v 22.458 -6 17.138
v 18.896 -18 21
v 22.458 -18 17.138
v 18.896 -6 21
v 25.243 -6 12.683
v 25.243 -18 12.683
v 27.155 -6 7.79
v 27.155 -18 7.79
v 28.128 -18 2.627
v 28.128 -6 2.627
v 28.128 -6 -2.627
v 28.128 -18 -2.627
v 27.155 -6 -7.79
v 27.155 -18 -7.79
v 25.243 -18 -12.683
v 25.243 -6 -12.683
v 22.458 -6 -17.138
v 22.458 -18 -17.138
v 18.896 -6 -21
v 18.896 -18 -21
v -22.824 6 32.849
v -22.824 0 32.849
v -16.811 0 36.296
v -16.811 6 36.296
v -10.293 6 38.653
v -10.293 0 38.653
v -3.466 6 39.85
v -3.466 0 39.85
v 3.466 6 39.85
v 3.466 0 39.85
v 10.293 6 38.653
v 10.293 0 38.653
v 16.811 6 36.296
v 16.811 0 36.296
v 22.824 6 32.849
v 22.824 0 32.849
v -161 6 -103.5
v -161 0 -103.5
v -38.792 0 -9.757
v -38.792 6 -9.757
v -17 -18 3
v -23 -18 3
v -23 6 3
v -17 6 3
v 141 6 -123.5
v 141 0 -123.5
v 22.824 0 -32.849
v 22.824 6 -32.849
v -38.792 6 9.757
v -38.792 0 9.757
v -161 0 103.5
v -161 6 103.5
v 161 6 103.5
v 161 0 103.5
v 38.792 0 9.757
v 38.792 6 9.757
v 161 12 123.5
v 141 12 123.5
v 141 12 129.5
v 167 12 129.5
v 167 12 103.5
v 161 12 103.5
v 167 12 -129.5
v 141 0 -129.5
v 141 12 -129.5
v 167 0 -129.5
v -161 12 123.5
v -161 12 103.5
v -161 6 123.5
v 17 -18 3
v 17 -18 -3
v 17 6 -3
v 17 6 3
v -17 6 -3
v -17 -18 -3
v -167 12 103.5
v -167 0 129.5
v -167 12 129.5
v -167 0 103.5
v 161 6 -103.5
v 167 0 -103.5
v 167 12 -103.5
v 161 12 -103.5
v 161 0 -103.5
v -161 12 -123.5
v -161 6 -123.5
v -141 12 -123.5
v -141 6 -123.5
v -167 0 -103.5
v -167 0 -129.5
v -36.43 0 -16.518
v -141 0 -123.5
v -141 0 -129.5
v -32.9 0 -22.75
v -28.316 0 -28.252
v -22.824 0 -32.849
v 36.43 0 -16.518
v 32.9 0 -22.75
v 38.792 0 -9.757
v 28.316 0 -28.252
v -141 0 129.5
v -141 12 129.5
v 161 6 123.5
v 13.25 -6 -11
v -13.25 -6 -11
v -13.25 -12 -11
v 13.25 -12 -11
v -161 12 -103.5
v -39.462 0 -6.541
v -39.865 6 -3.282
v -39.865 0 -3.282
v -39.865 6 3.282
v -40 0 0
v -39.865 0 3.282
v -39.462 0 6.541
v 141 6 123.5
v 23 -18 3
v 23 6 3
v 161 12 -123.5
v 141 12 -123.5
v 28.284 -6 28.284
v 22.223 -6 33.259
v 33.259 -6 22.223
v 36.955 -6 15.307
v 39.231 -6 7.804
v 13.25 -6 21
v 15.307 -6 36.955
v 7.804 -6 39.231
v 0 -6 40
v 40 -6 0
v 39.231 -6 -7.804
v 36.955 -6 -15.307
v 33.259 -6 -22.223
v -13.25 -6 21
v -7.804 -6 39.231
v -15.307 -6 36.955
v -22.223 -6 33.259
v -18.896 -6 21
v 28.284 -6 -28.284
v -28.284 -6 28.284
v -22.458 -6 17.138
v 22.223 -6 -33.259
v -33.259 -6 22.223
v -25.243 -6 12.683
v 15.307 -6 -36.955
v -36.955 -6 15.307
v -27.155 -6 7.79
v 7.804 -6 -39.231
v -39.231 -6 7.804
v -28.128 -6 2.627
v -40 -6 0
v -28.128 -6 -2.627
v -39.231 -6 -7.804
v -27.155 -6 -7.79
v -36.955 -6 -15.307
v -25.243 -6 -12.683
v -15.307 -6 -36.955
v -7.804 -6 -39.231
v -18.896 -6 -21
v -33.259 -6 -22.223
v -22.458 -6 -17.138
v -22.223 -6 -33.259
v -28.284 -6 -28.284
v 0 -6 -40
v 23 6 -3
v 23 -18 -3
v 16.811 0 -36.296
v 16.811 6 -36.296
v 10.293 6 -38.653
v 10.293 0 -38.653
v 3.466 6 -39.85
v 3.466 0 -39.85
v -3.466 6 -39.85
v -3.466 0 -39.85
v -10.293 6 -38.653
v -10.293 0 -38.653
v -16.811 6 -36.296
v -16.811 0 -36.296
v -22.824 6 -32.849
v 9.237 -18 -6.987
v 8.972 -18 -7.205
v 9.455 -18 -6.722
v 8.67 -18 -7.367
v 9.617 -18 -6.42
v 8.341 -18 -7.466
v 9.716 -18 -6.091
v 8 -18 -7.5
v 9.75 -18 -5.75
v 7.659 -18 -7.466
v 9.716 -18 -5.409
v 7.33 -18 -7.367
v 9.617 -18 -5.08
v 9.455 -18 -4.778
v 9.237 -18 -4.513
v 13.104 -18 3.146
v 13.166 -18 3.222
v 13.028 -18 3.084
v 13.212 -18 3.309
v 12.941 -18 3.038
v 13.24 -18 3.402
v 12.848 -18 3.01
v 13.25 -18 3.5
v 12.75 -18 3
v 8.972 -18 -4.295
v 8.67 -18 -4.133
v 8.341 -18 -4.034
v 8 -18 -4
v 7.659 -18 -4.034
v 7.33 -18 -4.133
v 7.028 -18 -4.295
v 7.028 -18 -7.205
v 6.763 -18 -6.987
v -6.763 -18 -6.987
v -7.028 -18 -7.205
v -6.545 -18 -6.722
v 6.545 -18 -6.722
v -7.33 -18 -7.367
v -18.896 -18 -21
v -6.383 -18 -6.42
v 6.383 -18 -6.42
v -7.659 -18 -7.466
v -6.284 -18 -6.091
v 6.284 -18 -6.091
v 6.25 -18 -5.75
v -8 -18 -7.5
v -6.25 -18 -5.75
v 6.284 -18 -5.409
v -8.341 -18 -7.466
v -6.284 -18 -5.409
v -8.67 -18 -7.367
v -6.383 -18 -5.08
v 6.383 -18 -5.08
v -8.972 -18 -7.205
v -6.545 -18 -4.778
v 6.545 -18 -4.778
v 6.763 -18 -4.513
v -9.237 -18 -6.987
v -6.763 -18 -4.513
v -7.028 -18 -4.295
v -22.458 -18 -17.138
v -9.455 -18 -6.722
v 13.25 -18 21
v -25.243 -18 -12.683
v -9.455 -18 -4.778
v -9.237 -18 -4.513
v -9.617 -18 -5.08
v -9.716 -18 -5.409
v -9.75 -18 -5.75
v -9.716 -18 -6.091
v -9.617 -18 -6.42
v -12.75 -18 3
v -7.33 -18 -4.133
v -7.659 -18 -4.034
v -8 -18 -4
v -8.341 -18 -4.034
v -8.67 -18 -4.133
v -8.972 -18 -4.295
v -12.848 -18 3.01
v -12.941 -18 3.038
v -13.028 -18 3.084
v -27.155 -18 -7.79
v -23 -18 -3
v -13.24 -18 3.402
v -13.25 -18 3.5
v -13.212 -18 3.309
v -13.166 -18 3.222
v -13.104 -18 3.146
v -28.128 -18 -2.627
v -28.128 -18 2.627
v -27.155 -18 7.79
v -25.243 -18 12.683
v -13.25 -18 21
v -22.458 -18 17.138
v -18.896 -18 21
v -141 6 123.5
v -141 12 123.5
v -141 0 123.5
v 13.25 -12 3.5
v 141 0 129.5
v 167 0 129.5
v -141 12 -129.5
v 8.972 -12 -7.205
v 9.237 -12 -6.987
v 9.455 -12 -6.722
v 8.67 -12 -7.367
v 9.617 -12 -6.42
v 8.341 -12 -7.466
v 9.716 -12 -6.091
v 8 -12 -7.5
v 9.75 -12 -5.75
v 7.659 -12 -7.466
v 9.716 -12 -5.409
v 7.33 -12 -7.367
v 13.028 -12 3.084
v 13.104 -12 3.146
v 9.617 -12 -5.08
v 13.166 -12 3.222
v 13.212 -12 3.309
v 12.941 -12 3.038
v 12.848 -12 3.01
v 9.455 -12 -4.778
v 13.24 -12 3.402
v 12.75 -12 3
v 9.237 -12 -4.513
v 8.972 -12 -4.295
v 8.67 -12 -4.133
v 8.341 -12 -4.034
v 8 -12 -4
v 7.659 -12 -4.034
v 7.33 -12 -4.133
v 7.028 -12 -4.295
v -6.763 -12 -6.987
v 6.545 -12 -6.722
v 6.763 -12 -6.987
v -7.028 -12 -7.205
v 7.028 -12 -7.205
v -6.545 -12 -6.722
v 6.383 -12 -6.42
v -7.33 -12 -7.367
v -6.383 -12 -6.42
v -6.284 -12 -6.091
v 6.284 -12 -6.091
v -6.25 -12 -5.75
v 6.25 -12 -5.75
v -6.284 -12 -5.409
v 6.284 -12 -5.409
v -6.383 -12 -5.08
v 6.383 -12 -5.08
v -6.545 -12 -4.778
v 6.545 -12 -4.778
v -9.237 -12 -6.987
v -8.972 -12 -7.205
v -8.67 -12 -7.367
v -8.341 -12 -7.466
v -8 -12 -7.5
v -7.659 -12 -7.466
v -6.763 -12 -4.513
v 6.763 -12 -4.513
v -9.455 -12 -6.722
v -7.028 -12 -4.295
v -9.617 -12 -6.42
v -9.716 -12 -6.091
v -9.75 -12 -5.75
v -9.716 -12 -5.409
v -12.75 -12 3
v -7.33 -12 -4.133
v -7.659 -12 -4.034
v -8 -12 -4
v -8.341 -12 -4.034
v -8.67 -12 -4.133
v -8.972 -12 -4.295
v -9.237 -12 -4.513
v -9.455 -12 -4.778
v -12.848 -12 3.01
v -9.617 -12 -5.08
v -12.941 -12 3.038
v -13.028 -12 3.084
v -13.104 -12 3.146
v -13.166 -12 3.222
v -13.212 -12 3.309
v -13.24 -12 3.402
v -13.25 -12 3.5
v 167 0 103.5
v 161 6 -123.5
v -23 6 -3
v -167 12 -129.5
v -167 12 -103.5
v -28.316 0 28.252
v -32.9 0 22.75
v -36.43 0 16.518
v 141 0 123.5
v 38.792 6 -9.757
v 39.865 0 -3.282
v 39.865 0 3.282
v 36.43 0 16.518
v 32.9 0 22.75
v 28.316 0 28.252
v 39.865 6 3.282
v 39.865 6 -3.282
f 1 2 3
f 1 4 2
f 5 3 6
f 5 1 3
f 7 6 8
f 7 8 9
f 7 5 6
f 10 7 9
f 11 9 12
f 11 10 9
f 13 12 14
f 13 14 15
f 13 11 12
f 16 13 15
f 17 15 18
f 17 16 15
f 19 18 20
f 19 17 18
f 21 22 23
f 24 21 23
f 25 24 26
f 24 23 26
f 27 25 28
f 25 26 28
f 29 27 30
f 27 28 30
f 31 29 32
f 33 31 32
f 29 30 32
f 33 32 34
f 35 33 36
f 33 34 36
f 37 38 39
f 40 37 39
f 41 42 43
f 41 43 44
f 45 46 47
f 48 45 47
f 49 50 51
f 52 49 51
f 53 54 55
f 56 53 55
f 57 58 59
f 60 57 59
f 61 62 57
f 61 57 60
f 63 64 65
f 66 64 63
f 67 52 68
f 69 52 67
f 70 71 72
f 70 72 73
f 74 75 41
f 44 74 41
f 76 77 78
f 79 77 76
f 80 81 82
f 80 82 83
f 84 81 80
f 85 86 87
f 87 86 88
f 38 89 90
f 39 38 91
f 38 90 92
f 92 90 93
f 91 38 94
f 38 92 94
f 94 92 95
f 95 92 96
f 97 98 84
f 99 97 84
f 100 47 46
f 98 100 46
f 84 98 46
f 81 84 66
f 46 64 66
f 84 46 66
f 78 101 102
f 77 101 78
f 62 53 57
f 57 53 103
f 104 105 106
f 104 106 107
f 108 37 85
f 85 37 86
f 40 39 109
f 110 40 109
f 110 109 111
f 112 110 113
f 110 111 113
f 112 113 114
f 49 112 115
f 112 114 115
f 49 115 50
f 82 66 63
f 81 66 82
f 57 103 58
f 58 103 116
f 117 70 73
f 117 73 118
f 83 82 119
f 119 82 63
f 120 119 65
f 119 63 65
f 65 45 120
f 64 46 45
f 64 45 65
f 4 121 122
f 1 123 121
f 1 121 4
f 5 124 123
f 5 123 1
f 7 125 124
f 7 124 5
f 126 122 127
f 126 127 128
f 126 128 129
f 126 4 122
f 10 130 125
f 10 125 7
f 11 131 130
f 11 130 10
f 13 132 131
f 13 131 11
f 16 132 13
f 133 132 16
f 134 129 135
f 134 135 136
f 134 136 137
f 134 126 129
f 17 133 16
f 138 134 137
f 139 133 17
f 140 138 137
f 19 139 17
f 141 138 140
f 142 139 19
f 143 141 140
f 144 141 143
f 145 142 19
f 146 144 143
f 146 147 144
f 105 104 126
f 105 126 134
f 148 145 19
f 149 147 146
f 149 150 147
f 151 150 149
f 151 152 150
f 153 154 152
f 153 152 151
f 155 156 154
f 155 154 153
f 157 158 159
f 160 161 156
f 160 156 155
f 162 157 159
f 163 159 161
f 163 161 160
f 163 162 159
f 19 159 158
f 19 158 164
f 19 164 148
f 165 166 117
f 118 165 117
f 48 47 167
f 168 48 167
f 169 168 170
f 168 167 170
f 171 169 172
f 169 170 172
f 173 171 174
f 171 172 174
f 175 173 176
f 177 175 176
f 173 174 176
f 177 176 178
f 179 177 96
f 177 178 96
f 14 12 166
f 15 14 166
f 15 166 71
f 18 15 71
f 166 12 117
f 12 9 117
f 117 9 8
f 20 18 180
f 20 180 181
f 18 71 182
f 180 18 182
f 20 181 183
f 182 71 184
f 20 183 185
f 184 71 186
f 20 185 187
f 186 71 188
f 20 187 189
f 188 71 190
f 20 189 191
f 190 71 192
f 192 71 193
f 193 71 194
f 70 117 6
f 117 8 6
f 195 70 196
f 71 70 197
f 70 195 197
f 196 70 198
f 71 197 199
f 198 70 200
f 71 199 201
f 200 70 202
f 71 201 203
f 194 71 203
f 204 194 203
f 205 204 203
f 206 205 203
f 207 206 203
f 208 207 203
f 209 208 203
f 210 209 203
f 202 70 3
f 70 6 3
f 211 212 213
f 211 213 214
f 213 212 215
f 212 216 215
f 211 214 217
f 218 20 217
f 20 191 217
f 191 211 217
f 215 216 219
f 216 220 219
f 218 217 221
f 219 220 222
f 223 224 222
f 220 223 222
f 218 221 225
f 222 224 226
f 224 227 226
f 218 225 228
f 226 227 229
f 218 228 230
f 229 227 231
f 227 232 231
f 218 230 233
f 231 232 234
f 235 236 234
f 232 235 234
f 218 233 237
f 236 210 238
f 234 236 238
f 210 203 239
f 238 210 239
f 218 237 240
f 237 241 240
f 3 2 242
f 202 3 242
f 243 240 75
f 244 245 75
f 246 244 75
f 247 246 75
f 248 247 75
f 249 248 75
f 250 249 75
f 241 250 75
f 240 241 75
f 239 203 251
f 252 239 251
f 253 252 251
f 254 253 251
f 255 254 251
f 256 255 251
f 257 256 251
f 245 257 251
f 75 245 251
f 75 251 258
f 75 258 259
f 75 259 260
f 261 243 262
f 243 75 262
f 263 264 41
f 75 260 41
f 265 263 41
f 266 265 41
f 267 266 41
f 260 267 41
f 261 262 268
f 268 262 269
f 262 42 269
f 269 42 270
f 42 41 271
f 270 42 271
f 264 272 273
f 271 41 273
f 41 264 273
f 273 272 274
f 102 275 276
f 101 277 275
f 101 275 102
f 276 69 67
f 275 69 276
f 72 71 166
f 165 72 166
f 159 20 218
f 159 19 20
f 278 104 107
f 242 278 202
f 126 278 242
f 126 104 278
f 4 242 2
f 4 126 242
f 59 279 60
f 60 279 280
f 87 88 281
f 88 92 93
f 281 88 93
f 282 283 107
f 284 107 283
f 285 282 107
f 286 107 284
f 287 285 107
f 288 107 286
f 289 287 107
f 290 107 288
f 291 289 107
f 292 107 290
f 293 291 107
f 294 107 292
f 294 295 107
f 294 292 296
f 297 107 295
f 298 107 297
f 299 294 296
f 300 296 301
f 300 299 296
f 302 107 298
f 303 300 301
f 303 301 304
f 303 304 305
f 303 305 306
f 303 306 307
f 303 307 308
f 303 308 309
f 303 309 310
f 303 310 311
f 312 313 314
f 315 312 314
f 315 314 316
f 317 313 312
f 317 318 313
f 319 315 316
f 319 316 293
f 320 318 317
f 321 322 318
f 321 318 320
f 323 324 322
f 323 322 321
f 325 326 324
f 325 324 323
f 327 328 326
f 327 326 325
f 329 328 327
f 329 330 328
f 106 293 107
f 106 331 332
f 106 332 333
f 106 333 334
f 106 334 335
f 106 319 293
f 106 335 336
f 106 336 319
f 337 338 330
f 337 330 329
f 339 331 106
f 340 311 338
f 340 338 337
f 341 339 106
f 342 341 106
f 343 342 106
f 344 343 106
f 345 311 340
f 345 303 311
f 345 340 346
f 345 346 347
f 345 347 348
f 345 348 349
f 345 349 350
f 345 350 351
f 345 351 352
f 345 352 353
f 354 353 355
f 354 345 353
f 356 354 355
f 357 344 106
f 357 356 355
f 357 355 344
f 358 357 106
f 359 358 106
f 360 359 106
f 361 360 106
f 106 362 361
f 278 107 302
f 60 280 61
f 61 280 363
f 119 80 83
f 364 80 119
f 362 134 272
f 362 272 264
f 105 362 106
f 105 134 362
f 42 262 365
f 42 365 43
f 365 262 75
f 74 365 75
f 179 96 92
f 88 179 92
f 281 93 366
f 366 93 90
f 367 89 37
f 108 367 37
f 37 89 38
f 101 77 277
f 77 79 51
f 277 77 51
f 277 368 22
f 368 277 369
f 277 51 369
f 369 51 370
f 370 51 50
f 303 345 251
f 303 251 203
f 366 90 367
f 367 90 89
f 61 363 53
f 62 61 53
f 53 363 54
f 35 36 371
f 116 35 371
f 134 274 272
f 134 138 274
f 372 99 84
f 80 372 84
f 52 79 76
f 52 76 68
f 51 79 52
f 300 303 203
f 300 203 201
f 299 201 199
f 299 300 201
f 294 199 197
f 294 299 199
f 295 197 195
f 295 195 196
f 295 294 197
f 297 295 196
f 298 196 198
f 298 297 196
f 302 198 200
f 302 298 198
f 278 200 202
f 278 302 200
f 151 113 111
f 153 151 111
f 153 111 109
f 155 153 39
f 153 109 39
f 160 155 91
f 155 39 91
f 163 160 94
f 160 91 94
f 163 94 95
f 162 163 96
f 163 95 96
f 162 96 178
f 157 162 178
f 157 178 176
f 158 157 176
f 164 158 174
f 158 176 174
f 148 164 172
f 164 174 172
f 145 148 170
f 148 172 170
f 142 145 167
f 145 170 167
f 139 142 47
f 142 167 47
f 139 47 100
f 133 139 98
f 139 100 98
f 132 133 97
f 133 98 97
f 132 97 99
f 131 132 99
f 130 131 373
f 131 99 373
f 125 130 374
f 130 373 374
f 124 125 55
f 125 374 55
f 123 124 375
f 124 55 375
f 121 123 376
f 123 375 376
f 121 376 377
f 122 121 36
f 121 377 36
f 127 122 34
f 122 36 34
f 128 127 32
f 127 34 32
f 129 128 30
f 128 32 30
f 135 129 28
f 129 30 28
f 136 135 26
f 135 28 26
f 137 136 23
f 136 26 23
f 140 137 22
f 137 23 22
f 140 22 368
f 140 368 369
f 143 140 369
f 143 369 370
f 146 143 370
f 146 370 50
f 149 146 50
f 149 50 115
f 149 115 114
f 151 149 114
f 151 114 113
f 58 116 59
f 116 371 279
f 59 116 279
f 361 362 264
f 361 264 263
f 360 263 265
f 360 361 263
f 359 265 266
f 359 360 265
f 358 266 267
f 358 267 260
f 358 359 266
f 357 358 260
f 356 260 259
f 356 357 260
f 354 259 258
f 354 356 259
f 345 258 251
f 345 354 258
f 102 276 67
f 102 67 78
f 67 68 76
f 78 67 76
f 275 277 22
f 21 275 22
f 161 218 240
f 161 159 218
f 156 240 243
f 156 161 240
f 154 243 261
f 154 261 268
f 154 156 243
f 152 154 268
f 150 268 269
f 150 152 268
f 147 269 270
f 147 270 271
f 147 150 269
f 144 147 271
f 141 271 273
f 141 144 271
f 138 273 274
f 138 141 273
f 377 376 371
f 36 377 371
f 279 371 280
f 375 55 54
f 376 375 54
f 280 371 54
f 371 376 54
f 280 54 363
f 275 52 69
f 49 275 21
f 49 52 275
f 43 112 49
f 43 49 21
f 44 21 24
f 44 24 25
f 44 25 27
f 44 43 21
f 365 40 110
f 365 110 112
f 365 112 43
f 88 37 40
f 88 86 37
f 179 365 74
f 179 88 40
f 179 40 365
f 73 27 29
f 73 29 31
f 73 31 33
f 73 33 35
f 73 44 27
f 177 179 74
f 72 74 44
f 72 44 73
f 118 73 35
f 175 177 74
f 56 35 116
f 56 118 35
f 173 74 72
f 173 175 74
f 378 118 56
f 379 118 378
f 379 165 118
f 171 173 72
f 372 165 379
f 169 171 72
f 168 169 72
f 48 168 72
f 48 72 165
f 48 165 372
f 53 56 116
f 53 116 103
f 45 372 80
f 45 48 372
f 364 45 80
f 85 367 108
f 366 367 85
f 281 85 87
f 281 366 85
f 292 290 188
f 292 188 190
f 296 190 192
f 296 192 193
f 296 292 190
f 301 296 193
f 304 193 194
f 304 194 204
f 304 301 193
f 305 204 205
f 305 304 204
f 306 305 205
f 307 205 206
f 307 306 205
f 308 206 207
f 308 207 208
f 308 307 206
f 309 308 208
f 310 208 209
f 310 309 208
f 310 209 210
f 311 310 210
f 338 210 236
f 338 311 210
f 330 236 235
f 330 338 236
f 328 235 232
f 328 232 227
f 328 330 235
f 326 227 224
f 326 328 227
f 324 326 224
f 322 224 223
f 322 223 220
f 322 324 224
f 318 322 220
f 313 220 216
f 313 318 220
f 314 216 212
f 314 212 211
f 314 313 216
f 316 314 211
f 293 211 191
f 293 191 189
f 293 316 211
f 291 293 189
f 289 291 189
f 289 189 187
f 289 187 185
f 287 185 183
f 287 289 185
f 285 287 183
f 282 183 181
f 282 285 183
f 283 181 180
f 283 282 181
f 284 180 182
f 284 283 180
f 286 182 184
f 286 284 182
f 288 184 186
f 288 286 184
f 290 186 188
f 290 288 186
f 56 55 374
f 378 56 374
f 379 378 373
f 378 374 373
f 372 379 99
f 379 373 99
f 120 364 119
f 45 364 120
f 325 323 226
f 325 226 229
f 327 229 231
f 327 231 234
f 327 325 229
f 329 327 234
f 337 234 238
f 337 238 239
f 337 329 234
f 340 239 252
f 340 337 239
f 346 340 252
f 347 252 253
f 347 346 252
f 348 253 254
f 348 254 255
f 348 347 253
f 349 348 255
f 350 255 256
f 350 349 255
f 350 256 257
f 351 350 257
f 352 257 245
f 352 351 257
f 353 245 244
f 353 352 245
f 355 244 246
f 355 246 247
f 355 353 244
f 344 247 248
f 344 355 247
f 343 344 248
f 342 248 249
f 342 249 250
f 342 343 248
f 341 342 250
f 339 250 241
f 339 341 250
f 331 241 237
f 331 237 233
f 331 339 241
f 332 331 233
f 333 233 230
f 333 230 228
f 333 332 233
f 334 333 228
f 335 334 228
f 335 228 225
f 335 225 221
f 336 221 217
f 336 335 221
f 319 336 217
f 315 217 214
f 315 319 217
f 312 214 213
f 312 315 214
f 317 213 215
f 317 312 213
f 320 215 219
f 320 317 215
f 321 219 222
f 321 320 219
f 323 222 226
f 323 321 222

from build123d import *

# Parameters (mm, degrees)
SALIENTE_EXTRUIR1_DEPTH = 6
SALIENTE_EXTRUIR2_DEPTH = 12
CROQUIS7_R              = 40
SALIENTE_EXTRUIR5_DEPTH = 6
SALIENTE_EXTRUIR3_DEPTH = 6
CROQUIS6_R              = 1.75
SALIENTE_EXTRUIR4_DEPTH = 6
CROQUIS8_W              = 6
CROQUIS8_H              = 6
CORTAR_EXTRUIR1_DEPTH   = 31


with BuildPart() as part:
    # Croquis1 → Saliente-Extruir1 (new body)
    with BuildSketch(Plane(origin=(0, 0, 0), x_dir=(1, 0, 0), z_dir=(0, 1, 0))):
        with BuildLine():
            Line((-161, 103.5), (-38.791887254, 9.756509788))
            ThreePointArc((-38.791887254, 9.756509788), (-40, 0), (-38.791887254, -9.756509788))
            Line((-38.791887254, -9.756509788), (-161, -103.5))
            Line((-161, -103.5), (-161, -123.5))
            Line((-161, -123.5), (-141, -123.5))
            Line((-141, -123.5), (-22.823766962, -32.84928708))
            ThreePointArc((-22.823766962, -32.84928708), (0, -40), (22.823766962, -32.84928708))
            Line((22.823766962, -32.84928708), (141, -123.5))
            Line((141, -123.5), (161, -123.5))
            Line((161, -123.5), (161, -103.5))
            Line((161, -103.5), (38.791887254, -9.756509788))
            ThreePointArc((38.791887254, -9.756509788), (40, 0), (38.791887254, 9.756509788))
            Line((38.791887254, 9.756509788), (161, 103.5))
            Line((161, 103.5), (161, 123.5))
            Line((161, 123.5), (141, 123.5))
            Line((141, 123.5), (22.823766962, 32.84928708))
            ThreePointArc((22.823766962, 32.84928708), (0, 40), (-22.823766962, 32.84928708))
            Line((-22.823766962, 32.84928708), (-141, 123.5))
            Line((-141, 123.5), (-161, 123.5))
            Line((-161, 123.5), (-161, 103.5))
        make_face()
    extrude(amount=SALIENTE_EXTRUIR1_DEPTH)

    # Croquis4 → Saliente-Extruir2 (add)
    with BuildSketch(Plane(origin=(0, 0, 0), x_dir=(1, 0, 0), z_dir=(0, 1, 0))):
        Polygon((-161, 103.5), (-161, 123.5), (-141, 123.5), (-141, 129.5), (-167, 129.5), (-167, 103.5), align=None)
        Polygon((-161, -103.5), (-161, -123.5), (-141, -123.5), (-141, -129.5), (-167, -129.5), (-167, -103.5), align=None)
        Polygon((167, -103.5), (161, -103.5), (161, -123.5), (141, -123.5), (141, -129.5), (167, -129.5), align=None)
        Polygon((167, 103.5), (161, 103.5), (161, 123.5), (141, 123.5), (141, 129.5), (167, 129.5), align=None)
    extrude(amount=SALIENTE_EXTRUIR2_DEPTH)

    # Croquis7 → Saliente-Extruir5 (add)
    with BuildSketch(Plane(origin=(0, 0, 0), x_dir=(-1, 0, 0), z_dir=(0, -1, 0))):
        Circle(CROQUIS7_R)
    extrude(amount=SALIENTE_EXTRUIR5_DEPTH)

    # Croquis5 → Saliente-Extruir3 (add)
    with BuildSketch(Plane.XZ.offset(6)):
        with BuildLine():
            Line((18.896097481, -21), (-18.896097481, -21))
            ThreePointArc((-18.896097481, -21), (-28.25, 0), (-18.896097481, 21))
            Line((-18.896097481, 21), (-13.25, 21))
            Line((-13.25, 21), (-13.25, -11))
            Line((-13.25, -11), (13.25, -11))
            Line((13.25, -11), (13.25, 21))
            Line((13.25, 21), (18.896097481, 21))
            ThreePointArc((18.896097481, 21), (28.25, 0), (18.896097481, -21))
        make_face()
    extrude(amount=SALIENTE_EXTRUIR3_DEPTH)

    # Croquis6 → Saliente-Extruir4 (add)
    with BuildSketch(Plane.XZ.offset(12)):
        with BuildLine():
            Line((-18.896097481, 21), (-13.25, 21))
            Line((-13.25, 21), (-13.25, 3.5))
            ThreePointArc((-13.25, 3.5), (-13.103553391, 3.146446609), (-12.75, 3))
            Line((-12.75, 3), (12.75, 3))
            ThreePointArc((12.75, 3), (13.103553391, 3.146446609), (13.25, 3.5))
            Line((13.25, 3.5), (13.25, 21))
            Line((13.25, 21), (18.896097481, 21))
            ThreePointArc((18.896097481, 21), (28.25, 0), (18.896097481, -21))
            Line((18.896097481, -21), (-18.896097481, -21))
            ThreePointArc((-18.896097481, -21), (-28.25, 0), (-18.896097481, 21))
        make_face()
        with Locations((-8, -5.75)):
            Circle(CROQUIS6_R, mode=Mode.SUBTRACT)
        with Locations((8, -5.75)):
            Circle(CROQUIS6_R, mode=Mode.SUBTRACT)
    extrude(amount=SALIENTE_EXTRUIR4_DEPTH)

    # Croquis8 → Cortar-Extruir1 (cut, through all)
    with BuildSketch(Plane.XZ.offset(18)):
        with Locations((-20, 0)):
            Rectangle(CROQUIS8_W, CROQUIS8_H)
        with Locations((20, 0)):
            Rectangle(CROQUIS8_W, CROQUIS8_H)
    extrude(amount=-CORTAR_EXTRUIR1_DEPTH, mode=Mode.SUBTRACT)


solid = part.part
